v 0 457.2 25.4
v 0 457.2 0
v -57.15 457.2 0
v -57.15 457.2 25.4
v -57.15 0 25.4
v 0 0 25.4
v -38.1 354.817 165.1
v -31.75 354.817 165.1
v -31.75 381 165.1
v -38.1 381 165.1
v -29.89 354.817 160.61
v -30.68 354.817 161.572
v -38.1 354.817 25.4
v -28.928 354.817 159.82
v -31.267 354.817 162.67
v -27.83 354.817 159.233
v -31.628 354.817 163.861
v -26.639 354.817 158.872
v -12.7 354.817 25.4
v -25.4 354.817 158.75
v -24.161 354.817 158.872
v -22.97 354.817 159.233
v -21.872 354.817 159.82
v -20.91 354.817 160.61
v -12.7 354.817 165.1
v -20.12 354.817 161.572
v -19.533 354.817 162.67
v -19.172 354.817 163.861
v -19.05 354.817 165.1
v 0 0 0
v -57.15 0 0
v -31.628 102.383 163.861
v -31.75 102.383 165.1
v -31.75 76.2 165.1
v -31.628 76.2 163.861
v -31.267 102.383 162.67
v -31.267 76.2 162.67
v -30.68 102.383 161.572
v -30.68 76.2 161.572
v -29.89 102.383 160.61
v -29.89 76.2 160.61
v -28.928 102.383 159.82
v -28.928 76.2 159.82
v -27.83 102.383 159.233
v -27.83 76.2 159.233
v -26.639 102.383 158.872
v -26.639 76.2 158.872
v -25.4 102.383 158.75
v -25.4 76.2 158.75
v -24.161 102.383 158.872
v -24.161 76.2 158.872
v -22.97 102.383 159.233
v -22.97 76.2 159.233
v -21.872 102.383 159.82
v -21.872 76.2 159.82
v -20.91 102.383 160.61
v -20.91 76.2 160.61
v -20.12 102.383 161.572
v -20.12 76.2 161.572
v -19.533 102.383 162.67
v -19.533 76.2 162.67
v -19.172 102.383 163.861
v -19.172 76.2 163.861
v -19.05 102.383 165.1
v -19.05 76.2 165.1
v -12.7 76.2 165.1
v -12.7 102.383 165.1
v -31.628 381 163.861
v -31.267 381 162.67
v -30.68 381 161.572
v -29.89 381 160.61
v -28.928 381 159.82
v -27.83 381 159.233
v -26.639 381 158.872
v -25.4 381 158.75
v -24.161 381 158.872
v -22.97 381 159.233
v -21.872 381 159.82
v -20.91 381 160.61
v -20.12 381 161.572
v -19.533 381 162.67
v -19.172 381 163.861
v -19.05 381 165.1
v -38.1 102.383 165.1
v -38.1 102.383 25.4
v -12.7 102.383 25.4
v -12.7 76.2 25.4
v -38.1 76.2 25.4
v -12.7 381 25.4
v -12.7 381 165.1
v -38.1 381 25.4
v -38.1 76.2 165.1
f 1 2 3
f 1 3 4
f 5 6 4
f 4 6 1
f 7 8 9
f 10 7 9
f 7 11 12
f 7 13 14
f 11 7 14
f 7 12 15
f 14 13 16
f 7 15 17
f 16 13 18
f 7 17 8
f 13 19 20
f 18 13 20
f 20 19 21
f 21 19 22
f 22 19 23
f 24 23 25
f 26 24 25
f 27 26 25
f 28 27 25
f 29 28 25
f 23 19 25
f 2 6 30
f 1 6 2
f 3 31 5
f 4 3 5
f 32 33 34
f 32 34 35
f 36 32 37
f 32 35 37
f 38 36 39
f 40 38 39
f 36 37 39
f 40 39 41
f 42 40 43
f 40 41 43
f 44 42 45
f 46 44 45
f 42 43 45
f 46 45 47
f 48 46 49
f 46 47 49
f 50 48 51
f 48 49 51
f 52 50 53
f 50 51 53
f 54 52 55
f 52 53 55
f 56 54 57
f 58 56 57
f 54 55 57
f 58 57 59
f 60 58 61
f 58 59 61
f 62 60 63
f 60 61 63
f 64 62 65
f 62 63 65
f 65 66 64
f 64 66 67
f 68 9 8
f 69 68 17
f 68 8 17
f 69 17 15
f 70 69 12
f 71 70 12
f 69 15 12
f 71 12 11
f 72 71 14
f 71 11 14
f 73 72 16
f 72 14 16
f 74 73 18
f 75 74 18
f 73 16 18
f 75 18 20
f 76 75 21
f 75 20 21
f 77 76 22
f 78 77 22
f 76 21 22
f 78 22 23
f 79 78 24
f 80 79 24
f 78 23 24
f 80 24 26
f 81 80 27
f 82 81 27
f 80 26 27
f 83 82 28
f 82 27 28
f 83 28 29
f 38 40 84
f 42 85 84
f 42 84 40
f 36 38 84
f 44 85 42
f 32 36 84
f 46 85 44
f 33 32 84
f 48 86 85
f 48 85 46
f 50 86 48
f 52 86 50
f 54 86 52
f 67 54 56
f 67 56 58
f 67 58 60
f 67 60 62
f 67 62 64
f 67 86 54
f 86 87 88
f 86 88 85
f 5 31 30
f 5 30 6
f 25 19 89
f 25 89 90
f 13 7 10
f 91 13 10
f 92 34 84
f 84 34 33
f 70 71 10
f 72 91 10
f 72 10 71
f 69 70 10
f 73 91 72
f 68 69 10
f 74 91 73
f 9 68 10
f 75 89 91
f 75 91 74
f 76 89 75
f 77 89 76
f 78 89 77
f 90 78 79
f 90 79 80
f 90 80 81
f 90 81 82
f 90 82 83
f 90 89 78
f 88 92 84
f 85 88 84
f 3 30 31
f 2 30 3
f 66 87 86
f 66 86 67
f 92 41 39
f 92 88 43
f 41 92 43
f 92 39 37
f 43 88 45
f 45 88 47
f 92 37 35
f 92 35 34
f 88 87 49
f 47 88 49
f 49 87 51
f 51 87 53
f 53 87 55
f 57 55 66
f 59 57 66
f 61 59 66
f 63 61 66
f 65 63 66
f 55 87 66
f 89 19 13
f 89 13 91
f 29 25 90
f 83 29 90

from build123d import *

# Parameters (mm, degrees)
F0_W           = 457.2
F0_H           = 25.4
F1_DEPTH       = 203.2
F2_W           = 26.1833593249
F2_H           = 139.7
F3_DEPTH       = 38.1
F4_W           = 12.7
F4_H           = 139.7
F5_DEPTH       = 381.001
F6_W           = 31.75
F6_H           = 152.4
F7_DEPTH       = 38.1
F9_DEPTH       = 196.85
F9_DEPTH_BACK  = 6.35
F11_DEPTH      = 50.8
F12_R          = 22.225
F13_DEPTH      = 12.7
F13_DEPTH_BACK = 139.7
F14_R          = 19.05
F15_DEPTH      = 6.35
F16_R          = 19.05
F17_DEPTH      = 6.35
F19_R          = 12.7
F20_DEPTH      = 190.5
F20_DEPTH_BACK = 38.1
F22_DEPTH      = 114.3
F24_DEPTH      = 209.55
F25_W          = 9.525
F25_H          = 50.8
F26_DEPTH      = 209.55
F28_DEPTH      = 12.7
F28_DEPTH_BACK = 63.5
F29_R          = 6.35
F30_DEPTH      = 406.4
F31_W          = 177.8
F31_H          = 271.1930572987
F32_DEPTH      = 457.201


with BuildPart() as f1:
    # F0 (on Right) → F1 (new body)
    with BuildSketch(Plane.YZ):
        with Locations((228.6, 12.7)):
            Rectangle(F0_W, F0_H)
    extrude(amount=-F1_DEPTH)

    # F6 (on face) → F7 (join)
    with BuildSketch(Plane(origin=(-203.2, 0, 0), x_dir=(0, -1, 0), z_dir=(-1, 0, 0))):
        with Locations((-315.4549715519, 101.6)):
            Rectangle(F6_W, F6_H)
        with Locations((-156.7049715519, 101.6)):
            Rectangle(F6_W, F6_H)
    extrude(amount=-F7_DEPTH)

    # F8 (on face) → F9 (join, two sides)
    with BuildSketch(Plane(origin=(0, 331.3299715519, 0), x_dir=(-1, 0, 0), z_dir=(0, 1, 0))) as f9_sk:
        Polygon((198.8146968374, 190.5), (169.4853031626, 190.5), (154.8206063252, 165.1), (169.4853031626, 139.7), (198.8146968374, 139.7), (213.4793936748, 165.1), align=None)
    extrude(amount=-F9_DEPTH)
    extrude(f9_sk.sketch, amount=F9_DEPTH_BACK)

    # F10 (on face) → F11 (cut)
    with BuildSketch(Plane(origin=(-203.2, 0, 0), x_dir=(0, -1, 0), z_dir=(-1, 0, 0))):
        Polygon((-299.5799715519, 190.5), (-299.5799715519, 139.7), (-172.5799715519, 139.7), (-173.685669899, 190.5), align=None)
    extrude(amount=-F11_DEPTH, mode=Mode.SUBTRACT)

    # F12 (on face) → F13 (cut, two sides)
    with BuildSketch(Plane.XZ.offset(-299.5799715519)) as f13_sk:
        with Locations((-184.15, 165.1)):
            Circle(F12_R)
    extrude(amount=-F13_DEPTH, mode=Mode.SUBTRACT)
    extrude(f13_sk.sketch, amount=F13_DEPTH_BACK, mode=Mode.SUBTRACT)

    # F14 (on face) → F15 (cut)
    with BuildSketch(Plane.XZ.offset(-134.4799715519)):
        with Locations((-184.15, 165.1)):
            Circle(F14_R)
    extrude(amount=-F15_DEPTH, mode=Mode.SUBTRACT)

    # F16 (on face) → F17 (cut)
    with BuildSketch(Plane(origin=(0, 337.6799715519, 0), x_dir=(-1, 0, 0), z_dir=(0, 1, 0))):
        with Locations((184.15, 165.1)):
            Circle(F16_R)
    extrude(amount=-F17_DEPTH, mode=Mode.SUBTRACT)


with BuildPart() as f3:
    # F2 (on face) → F3 (new body)
    with BuildSketch(Plane.YZ):
        with Locations((89.2916796625, 95.25)):
            Rectangle(F2_W, F2_H)
    extrude(amount=-F3_DEPTH)


with BuildPart() as f3b:
    # F2 (on face) → F3, piece 2 (new body)
    with BuildSketch(Plane.YZ):
        with Locations((367.9083203375, 95.25)):
            Rectangle(F2_W, F2_H)
    extrude(amount=-F3_DEPTH)


with BuildPart() as f5_tool:
    # F4 (on face) → F5 (new body, through all)
    with BuildSketch(Plane.XZ.offset(-76.2)):
        with Locations((-6.35, 95.25)):
            Rectangle(F4_W, F4_H)
    extrude(amount=-F5_DEPTH)


with BuildPart() as f3_1:
    add(f3.part)

    # F5: cut by f5_tool
    add(f5_tool.part, mode=Mode.SUBTRACT)


with BuildPart() as f3b_1:
    add(f3b.part)

    # F5: cut by f5_tool
    add(f5_tool.part, mode=Mode.SUBTRACT)


with BuildPart() as f20:
    # F19 (on face) → F20 (new body, two sides)
    with BuildSketch(Plane(origin=(0, 159.8799715519, 0), x_dir=(-1, 0, 0), z_dir=(0, 1, 0))) as f20_sk:
        with Locations((184.15, 165.1)):
            Circle(F19_R)
    extrude(amount=F20_DEPTH)
    extrude(f20_sk.sketch, amount=-F20_DEPTH_BACK)


with BuildPart() as f22:
    # F21 (on offset) → F22 (new body)
    with BuildSketch(Plane.XZ.offset(-293.2299715519)):
        with BuildLine():
            ThreePointArc((-165.100001748, 165.0918391247), (-165.100000437, 165.0959195623), (-165.1, 165.1))
            ThreePointArc((-165.1, 165.1), (-170.6796158184, 178.5703841816), (-184.15, 184.15))
            Line((-184.15, 184.15), (-184.15, 165.1))
            Line((-184.15, 165.1), (-165.100001748, 165.0918391247))
        make_face()
        with BuildLine():
            ThreePointArc((-184.15, 184.15), (-170.6796158184, 178.5703841816), (-165.1, 165.1))
            ThreePointArc((-165.1, 165.1), (-165.100000437, 165.0959195623), (-165.100001748, 165.0918391247))
            Line((-165.100001748, 165.0918391247), (-62.6194391727, 165.0479372263))
            Line((-62.6194391727, 165.0479372263), (-62.6194391727, 266.6479372263))
            Line((-62.6194391727, 266.6479372263), (-75.3194391727, 266.6479372263))
            Line((-75.3194391727, 266.6479372263), (-184.15, 184.15))
        make_face()
        with BuildLine():
            Line((-184.15, 165.1), (-184.15, 184.15))
            ThreePointArc((-184.15, 184.15), (-203.199998252, 165.1081608753), (-184.166321749, 146.0500069921))
            Line((-184.166321749, 146.0500069921), (-184.15, 165.1))
        make_face()
        with BuildLine():
            Line((-62.6194391727, 165.0479372263), (-165.100001748, 165.0918391247))
            ThreePointArc((-165.100001748, 165.0918391247), (-170.6882745145, 151.6209626845), (-184.166321749, 146.0500069921))
            Line((-184.166321749, 146.0500069921), (-75.4064838395, 63.4588556836))
            Line((-75.4064838395, 63.4588556837), (-62.7064885009, 63.4479745176))
            Line((-62.7064885009, 63.4479745176), (-62.6194391727, 165.0479372263))
        make_face()
        with BuildLine():
            ThreePointArc((-184.166321749, 146.0500069921), (-170.6882745145, 151.6209626845), (-165.100001748, 165.0918391247))
            Line((-165.100001748, 165.0918391247), (-184.15, 165.1))
            Line((-184.15, 165.1), (-184.166321749, 146.0500069921))
        make_face()
    extrude(amount=F22_DEPTH)


with BuildPart() as f24_tool:
    # F23 (on face) → F24 (new body)
    with BuildSketch(Plane.XY.offset(266.6479372263)):
        Polygon((-72.1444391727, 197.9799715519), (-72.1444391727, 274.1799715519), (-176.837772131, 280.5299715519), (-176.837772131, 191.6299715519), align=None)
    extrude(amount=-F24_DEPTH)


with BuildPart() as f20_1:
    add(f20.part)

    # F24: cut by f24_tool
    add(f24_tool.part, mode=Mode.SUBTRACT)


with BuildPart() as f22_1:
    add(f22.part)

    # F24: cut by f24_tool
    add(f24_tool.part, mode=Mode.SUBTRACT)

    # F25 (on face) → F26 (cut)
    with BuildSketch(Plane.XY.offset(266.6479372263)):
        with Locations((-67.3819391727, 236.0799715519)):
            Rectangle(F25_W, F25_H)
    extrude(amount=-F26_DEPTH, mode=Mode.SUBTRACT)

    # F27 (on face) → F28 (cut, two sides)
    with BuildSketch(Plane.XZ.offset(-261.4799715519)) as f28_sk:
        Polygon((-72.1444391727, 241.2479372138), (-72.1444391727, 228.5479372138), (-62.6194391727, 235.7778057206), (-62.6194391727, 248.4778057206), align=None)
        Polygon((-62.6800000811, 94.3640369384), (-72.1444391727, 101.5479372138), (-72.1444391727, 88.8479372138), (-62.6908812512, 81.6640369384), align=None)
        Polygon((-62.6194391727, 184.0979372138), (-72.1444391727, 184.0979372138), (-72.1444391727, 145.9979372138), (-62.6357609278, 145.9979372138), align=None)
    extrude(amount=-F28_DEPTH, mode=Mode.SUBTRACT)
    extrude(f28_sk.sketch, amount=F28_DEPTH_BACK, mode=Mode.SUBTRACT)


with BuildPart() as f30_tool:
    # F29 (on face) → F30 (new body)
    with BuildSketch(Plane.XZ.offset(-76.2)):
        with Locations((-25.4, 165.1)):
            Circle(F29_R)
    extrude(amount=-F30_DEPTH)


with BuildPart() as f3_2:
    add(f3_1.part)

    # F30: cut by f30_tool
    add(f30_tool.part, mode=Mode.SUBTRACT)


with BuildPart() as f3b_2:
    add(f3b_1.part)

    # F30: cut by f30_tool
    add(f30_tool.part, mode=Mode.SUBTRACT)


with BuildPart() as f32_tool:
    # F31 (on face) → F32 (new body, through all)
    with BuildSketch(Plane.XZ):
        with Locations((-146.05, 135.5965286493)):
            Rectangle(F31_W, F31_H)
    extrude(amount=-F32_DEPTH)


with BuildPart() as f1_1:
    add(f1.part)

    # F32: cut by f32_tool
    add(f32_tool.part, mode=Mode.SUBTRACT)


with BuildPart() as f20_2:
    add(f20_1.part)

    # F32: cut by f32_tool
    add(f32_tool.part, mode=Mode.SUBTRACT)


with BuildPart() as f22_2:
    add(f22_1.part)

    # F32: cut by f32_tool
    add(f32_tool.part, mode=Mode.SUBTRACT)


solid = Compound([f3_2.part, f3b_2.part, f1_1.part])
